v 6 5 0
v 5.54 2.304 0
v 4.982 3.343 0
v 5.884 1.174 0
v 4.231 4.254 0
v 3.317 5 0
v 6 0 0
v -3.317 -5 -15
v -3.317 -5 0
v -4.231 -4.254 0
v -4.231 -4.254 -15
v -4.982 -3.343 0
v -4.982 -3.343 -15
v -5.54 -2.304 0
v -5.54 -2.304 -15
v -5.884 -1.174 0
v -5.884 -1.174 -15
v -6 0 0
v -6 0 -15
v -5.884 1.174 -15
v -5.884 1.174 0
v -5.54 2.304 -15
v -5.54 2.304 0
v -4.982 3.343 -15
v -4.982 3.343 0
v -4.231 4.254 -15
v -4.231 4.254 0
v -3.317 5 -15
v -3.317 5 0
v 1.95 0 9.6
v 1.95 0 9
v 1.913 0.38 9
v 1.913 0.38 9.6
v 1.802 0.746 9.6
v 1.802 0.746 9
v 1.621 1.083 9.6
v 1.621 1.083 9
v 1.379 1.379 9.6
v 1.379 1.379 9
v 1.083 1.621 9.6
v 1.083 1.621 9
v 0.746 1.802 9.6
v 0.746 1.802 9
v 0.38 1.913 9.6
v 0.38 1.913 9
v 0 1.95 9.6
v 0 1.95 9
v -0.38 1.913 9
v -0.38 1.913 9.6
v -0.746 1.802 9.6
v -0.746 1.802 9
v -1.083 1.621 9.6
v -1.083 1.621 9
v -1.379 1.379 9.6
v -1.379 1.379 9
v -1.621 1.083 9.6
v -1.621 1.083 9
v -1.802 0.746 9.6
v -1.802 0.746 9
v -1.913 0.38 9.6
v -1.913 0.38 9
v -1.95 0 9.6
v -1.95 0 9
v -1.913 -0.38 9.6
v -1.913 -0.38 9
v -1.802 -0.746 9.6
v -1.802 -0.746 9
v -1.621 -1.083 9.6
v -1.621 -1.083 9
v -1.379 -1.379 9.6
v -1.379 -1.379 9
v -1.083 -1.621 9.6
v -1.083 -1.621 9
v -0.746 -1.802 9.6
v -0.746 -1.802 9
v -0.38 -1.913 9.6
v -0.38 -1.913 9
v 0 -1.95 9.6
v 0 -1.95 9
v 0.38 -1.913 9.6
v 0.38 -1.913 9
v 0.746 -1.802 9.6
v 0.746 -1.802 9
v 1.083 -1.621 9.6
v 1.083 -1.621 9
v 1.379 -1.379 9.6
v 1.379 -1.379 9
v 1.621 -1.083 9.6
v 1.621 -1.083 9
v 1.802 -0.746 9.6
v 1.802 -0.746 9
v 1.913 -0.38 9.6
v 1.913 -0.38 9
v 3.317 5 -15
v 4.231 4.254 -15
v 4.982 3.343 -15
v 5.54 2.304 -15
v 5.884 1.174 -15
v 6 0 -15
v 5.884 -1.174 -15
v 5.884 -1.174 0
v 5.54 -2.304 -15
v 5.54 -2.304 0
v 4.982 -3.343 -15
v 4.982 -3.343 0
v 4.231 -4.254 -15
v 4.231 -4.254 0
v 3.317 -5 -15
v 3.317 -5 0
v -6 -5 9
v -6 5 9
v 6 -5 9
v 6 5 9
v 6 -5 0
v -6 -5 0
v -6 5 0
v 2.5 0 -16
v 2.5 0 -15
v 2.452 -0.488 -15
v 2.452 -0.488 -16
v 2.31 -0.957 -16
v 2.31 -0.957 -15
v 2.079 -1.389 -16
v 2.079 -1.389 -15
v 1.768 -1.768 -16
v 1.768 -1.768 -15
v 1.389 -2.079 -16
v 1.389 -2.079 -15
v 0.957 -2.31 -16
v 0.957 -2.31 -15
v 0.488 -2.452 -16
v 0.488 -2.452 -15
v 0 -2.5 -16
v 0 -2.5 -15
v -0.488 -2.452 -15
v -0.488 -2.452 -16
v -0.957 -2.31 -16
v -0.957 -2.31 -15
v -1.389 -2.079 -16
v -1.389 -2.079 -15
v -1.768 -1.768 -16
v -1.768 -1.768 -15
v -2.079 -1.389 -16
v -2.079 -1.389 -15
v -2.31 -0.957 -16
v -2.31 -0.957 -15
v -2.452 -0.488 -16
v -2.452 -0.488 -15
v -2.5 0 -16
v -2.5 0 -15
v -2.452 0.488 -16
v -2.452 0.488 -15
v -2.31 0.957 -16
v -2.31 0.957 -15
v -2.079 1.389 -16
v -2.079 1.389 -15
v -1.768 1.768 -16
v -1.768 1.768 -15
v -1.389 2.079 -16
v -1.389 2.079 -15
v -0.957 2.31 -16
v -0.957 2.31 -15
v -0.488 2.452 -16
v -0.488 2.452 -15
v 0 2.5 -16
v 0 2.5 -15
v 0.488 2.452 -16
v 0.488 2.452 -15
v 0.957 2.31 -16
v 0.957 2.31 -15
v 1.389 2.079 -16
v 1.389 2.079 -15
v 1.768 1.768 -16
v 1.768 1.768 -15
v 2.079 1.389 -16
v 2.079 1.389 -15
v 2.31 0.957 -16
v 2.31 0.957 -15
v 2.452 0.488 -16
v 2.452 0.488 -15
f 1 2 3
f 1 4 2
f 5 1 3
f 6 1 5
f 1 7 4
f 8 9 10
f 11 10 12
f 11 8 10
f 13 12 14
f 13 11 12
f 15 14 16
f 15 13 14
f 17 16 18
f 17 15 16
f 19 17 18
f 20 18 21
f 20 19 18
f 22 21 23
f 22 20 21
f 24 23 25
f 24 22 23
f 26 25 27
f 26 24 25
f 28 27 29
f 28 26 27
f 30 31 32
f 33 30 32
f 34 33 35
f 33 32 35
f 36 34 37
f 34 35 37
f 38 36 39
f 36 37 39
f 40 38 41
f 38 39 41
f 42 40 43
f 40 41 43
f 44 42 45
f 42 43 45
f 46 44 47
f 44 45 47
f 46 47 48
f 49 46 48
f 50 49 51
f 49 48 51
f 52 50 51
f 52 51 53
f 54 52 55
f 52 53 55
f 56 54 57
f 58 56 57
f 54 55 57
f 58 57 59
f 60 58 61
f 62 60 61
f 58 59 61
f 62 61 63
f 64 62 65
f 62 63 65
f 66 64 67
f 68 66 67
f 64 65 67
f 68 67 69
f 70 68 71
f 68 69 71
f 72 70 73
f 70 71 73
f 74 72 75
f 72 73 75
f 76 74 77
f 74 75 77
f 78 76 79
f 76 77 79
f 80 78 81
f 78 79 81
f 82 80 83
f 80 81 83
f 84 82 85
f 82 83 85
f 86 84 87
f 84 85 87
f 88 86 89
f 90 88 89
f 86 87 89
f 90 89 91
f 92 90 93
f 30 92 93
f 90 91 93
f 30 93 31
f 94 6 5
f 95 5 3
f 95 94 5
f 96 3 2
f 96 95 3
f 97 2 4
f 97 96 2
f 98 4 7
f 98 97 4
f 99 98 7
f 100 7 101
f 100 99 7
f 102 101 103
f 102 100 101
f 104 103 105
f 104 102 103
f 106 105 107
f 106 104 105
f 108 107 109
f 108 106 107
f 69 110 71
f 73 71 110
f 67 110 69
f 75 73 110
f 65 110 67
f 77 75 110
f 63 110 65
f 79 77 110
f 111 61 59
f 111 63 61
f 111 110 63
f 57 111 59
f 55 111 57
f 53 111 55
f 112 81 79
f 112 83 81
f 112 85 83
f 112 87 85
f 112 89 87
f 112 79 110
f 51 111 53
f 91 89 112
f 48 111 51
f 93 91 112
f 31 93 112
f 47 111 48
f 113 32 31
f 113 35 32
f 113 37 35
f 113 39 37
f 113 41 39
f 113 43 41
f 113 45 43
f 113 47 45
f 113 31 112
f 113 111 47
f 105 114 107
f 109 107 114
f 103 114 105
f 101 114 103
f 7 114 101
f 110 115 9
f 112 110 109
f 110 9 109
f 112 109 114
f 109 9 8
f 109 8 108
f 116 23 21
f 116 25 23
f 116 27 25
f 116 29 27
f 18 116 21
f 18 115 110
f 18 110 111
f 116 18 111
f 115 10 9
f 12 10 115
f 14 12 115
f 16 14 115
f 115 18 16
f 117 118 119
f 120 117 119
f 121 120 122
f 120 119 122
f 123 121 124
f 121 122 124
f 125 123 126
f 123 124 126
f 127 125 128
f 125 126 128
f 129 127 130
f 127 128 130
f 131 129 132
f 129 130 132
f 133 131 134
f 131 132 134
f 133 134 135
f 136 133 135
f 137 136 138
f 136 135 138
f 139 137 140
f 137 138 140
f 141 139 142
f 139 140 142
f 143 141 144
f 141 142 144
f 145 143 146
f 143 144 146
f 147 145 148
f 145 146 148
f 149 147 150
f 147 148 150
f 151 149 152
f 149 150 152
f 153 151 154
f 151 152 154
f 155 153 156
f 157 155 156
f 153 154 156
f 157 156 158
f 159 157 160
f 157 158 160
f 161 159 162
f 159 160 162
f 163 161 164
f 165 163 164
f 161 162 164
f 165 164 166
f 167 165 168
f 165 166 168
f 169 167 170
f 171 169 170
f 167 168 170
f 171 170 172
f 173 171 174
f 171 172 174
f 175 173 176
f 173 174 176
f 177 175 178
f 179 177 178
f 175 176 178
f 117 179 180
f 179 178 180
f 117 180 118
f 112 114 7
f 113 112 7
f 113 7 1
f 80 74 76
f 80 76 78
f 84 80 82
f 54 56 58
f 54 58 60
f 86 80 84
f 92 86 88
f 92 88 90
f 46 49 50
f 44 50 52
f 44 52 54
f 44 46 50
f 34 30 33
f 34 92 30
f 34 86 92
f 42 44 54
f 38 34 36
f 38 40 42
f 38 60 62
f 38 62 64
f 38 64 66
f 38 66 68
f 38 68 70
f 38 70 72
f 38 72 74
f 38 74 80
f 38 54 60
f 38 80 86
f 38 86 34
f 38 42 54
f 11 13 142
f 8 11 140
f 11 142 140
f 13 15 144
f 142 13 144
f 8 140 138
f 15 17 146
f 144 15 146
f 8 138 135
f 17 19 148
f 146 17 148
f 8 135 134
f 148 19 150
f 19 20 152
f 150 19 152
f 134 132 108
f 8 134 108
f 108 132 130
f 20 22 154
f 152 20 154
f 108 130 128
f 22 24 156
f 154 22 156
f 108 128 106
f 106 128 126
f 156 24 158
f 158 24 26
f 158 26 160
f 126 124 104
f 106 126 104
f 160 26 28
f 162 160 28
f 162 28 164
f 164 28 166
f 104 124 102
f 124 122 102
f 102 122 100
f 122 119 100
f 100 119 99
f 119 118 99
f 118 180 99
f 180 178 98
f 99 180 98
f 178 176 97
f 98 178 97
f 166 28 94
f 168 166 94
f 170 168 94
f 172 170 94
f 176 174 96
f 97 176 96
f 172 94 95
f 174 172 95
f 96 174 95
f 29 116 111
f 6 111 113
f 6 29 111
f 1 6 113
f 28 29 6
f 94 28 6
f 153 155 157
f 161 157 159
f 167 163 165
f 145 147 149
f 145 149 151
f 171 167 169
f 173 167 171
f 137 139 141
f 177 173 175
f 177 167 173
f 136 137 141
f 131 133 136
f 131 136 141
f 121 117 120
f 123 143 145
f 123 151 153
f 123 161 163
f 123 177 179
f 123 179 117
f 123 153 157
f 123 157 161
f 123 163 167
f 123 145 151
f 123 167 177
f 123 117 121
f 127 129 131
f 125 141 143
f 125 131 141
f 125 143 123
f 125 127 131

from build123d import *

# Parameters (mm, degrees)
BOSS_EXTRUDE1_DEPTH      = 9
BOSS_EXTRUDE1_DEPTH_BACK = 15
SKETCH1_W                = 12
SKETCH1_H                = 10
SKETCH3_R                = 8.54
SKETCH3_R_2              = 6
CUT_EXTRUDE_THIN1_DEPTH  = 15
SKETCH5_R                = 2.5
BOSS_EXTRUDE2_DEPTH      = 1
SKETCH6_R                = 1.95
BOSS_EXTRUDE3_DEPTH      = 0.6


with BuildPart() as part:
    # Sketch1 → Boss-Extrude1 (new, two sides: drawn at the far end of the back side and taken through both)
    with BuildSketch(Plane.XY.offset(-BOSS_EXTRUDE1_DEPTH_BACK)):
        Rectangle(SKETCH1_W, SKETCH1_H)
    extrude(amount=BOSS_EXTRUDE1_DEPTH + BOSS_EXTRUDE1_DEPTH_BACK)

    # Sketch3 → Cut-Extrude-Thin1 (cut)
    with BuildSketch(Plane(origin=(0, 0, -15), x_dir=(-1, 0, 0), z_dir=(0, 0, -1))):
        Circle(SKETCH3_R)
        Circle(SKETCH3_R_2, mode=Mode.SUBTRACT)
    extrude(amount=-CUT_EXTRUDE_THIN1_DEPTH, mode=Mode.SUBTRACT)

    # Sketch5 → Boss-Extrude2 (add)
    with BuildSketch(Plane(origin=(0, 0, -15), x_dir=(-1, 0, 0), z_dir=(0, 0, -1))):
        with Locations(Location((0, 0, 0), (0, 0, 180))):
            Circle(SKETCH5_R)
    extrude(amount=BOSS_EXTRUDE2_DEPTH)

    # Sketch6 → Boss-Extrude3 (add)
    with BuildSketch(Plane.XY.offset(9)):
        Circle(SKETCH6_R)
    extrude(amount=BOSS_EXTRUDE3_DEPTH)


solid = part.part
